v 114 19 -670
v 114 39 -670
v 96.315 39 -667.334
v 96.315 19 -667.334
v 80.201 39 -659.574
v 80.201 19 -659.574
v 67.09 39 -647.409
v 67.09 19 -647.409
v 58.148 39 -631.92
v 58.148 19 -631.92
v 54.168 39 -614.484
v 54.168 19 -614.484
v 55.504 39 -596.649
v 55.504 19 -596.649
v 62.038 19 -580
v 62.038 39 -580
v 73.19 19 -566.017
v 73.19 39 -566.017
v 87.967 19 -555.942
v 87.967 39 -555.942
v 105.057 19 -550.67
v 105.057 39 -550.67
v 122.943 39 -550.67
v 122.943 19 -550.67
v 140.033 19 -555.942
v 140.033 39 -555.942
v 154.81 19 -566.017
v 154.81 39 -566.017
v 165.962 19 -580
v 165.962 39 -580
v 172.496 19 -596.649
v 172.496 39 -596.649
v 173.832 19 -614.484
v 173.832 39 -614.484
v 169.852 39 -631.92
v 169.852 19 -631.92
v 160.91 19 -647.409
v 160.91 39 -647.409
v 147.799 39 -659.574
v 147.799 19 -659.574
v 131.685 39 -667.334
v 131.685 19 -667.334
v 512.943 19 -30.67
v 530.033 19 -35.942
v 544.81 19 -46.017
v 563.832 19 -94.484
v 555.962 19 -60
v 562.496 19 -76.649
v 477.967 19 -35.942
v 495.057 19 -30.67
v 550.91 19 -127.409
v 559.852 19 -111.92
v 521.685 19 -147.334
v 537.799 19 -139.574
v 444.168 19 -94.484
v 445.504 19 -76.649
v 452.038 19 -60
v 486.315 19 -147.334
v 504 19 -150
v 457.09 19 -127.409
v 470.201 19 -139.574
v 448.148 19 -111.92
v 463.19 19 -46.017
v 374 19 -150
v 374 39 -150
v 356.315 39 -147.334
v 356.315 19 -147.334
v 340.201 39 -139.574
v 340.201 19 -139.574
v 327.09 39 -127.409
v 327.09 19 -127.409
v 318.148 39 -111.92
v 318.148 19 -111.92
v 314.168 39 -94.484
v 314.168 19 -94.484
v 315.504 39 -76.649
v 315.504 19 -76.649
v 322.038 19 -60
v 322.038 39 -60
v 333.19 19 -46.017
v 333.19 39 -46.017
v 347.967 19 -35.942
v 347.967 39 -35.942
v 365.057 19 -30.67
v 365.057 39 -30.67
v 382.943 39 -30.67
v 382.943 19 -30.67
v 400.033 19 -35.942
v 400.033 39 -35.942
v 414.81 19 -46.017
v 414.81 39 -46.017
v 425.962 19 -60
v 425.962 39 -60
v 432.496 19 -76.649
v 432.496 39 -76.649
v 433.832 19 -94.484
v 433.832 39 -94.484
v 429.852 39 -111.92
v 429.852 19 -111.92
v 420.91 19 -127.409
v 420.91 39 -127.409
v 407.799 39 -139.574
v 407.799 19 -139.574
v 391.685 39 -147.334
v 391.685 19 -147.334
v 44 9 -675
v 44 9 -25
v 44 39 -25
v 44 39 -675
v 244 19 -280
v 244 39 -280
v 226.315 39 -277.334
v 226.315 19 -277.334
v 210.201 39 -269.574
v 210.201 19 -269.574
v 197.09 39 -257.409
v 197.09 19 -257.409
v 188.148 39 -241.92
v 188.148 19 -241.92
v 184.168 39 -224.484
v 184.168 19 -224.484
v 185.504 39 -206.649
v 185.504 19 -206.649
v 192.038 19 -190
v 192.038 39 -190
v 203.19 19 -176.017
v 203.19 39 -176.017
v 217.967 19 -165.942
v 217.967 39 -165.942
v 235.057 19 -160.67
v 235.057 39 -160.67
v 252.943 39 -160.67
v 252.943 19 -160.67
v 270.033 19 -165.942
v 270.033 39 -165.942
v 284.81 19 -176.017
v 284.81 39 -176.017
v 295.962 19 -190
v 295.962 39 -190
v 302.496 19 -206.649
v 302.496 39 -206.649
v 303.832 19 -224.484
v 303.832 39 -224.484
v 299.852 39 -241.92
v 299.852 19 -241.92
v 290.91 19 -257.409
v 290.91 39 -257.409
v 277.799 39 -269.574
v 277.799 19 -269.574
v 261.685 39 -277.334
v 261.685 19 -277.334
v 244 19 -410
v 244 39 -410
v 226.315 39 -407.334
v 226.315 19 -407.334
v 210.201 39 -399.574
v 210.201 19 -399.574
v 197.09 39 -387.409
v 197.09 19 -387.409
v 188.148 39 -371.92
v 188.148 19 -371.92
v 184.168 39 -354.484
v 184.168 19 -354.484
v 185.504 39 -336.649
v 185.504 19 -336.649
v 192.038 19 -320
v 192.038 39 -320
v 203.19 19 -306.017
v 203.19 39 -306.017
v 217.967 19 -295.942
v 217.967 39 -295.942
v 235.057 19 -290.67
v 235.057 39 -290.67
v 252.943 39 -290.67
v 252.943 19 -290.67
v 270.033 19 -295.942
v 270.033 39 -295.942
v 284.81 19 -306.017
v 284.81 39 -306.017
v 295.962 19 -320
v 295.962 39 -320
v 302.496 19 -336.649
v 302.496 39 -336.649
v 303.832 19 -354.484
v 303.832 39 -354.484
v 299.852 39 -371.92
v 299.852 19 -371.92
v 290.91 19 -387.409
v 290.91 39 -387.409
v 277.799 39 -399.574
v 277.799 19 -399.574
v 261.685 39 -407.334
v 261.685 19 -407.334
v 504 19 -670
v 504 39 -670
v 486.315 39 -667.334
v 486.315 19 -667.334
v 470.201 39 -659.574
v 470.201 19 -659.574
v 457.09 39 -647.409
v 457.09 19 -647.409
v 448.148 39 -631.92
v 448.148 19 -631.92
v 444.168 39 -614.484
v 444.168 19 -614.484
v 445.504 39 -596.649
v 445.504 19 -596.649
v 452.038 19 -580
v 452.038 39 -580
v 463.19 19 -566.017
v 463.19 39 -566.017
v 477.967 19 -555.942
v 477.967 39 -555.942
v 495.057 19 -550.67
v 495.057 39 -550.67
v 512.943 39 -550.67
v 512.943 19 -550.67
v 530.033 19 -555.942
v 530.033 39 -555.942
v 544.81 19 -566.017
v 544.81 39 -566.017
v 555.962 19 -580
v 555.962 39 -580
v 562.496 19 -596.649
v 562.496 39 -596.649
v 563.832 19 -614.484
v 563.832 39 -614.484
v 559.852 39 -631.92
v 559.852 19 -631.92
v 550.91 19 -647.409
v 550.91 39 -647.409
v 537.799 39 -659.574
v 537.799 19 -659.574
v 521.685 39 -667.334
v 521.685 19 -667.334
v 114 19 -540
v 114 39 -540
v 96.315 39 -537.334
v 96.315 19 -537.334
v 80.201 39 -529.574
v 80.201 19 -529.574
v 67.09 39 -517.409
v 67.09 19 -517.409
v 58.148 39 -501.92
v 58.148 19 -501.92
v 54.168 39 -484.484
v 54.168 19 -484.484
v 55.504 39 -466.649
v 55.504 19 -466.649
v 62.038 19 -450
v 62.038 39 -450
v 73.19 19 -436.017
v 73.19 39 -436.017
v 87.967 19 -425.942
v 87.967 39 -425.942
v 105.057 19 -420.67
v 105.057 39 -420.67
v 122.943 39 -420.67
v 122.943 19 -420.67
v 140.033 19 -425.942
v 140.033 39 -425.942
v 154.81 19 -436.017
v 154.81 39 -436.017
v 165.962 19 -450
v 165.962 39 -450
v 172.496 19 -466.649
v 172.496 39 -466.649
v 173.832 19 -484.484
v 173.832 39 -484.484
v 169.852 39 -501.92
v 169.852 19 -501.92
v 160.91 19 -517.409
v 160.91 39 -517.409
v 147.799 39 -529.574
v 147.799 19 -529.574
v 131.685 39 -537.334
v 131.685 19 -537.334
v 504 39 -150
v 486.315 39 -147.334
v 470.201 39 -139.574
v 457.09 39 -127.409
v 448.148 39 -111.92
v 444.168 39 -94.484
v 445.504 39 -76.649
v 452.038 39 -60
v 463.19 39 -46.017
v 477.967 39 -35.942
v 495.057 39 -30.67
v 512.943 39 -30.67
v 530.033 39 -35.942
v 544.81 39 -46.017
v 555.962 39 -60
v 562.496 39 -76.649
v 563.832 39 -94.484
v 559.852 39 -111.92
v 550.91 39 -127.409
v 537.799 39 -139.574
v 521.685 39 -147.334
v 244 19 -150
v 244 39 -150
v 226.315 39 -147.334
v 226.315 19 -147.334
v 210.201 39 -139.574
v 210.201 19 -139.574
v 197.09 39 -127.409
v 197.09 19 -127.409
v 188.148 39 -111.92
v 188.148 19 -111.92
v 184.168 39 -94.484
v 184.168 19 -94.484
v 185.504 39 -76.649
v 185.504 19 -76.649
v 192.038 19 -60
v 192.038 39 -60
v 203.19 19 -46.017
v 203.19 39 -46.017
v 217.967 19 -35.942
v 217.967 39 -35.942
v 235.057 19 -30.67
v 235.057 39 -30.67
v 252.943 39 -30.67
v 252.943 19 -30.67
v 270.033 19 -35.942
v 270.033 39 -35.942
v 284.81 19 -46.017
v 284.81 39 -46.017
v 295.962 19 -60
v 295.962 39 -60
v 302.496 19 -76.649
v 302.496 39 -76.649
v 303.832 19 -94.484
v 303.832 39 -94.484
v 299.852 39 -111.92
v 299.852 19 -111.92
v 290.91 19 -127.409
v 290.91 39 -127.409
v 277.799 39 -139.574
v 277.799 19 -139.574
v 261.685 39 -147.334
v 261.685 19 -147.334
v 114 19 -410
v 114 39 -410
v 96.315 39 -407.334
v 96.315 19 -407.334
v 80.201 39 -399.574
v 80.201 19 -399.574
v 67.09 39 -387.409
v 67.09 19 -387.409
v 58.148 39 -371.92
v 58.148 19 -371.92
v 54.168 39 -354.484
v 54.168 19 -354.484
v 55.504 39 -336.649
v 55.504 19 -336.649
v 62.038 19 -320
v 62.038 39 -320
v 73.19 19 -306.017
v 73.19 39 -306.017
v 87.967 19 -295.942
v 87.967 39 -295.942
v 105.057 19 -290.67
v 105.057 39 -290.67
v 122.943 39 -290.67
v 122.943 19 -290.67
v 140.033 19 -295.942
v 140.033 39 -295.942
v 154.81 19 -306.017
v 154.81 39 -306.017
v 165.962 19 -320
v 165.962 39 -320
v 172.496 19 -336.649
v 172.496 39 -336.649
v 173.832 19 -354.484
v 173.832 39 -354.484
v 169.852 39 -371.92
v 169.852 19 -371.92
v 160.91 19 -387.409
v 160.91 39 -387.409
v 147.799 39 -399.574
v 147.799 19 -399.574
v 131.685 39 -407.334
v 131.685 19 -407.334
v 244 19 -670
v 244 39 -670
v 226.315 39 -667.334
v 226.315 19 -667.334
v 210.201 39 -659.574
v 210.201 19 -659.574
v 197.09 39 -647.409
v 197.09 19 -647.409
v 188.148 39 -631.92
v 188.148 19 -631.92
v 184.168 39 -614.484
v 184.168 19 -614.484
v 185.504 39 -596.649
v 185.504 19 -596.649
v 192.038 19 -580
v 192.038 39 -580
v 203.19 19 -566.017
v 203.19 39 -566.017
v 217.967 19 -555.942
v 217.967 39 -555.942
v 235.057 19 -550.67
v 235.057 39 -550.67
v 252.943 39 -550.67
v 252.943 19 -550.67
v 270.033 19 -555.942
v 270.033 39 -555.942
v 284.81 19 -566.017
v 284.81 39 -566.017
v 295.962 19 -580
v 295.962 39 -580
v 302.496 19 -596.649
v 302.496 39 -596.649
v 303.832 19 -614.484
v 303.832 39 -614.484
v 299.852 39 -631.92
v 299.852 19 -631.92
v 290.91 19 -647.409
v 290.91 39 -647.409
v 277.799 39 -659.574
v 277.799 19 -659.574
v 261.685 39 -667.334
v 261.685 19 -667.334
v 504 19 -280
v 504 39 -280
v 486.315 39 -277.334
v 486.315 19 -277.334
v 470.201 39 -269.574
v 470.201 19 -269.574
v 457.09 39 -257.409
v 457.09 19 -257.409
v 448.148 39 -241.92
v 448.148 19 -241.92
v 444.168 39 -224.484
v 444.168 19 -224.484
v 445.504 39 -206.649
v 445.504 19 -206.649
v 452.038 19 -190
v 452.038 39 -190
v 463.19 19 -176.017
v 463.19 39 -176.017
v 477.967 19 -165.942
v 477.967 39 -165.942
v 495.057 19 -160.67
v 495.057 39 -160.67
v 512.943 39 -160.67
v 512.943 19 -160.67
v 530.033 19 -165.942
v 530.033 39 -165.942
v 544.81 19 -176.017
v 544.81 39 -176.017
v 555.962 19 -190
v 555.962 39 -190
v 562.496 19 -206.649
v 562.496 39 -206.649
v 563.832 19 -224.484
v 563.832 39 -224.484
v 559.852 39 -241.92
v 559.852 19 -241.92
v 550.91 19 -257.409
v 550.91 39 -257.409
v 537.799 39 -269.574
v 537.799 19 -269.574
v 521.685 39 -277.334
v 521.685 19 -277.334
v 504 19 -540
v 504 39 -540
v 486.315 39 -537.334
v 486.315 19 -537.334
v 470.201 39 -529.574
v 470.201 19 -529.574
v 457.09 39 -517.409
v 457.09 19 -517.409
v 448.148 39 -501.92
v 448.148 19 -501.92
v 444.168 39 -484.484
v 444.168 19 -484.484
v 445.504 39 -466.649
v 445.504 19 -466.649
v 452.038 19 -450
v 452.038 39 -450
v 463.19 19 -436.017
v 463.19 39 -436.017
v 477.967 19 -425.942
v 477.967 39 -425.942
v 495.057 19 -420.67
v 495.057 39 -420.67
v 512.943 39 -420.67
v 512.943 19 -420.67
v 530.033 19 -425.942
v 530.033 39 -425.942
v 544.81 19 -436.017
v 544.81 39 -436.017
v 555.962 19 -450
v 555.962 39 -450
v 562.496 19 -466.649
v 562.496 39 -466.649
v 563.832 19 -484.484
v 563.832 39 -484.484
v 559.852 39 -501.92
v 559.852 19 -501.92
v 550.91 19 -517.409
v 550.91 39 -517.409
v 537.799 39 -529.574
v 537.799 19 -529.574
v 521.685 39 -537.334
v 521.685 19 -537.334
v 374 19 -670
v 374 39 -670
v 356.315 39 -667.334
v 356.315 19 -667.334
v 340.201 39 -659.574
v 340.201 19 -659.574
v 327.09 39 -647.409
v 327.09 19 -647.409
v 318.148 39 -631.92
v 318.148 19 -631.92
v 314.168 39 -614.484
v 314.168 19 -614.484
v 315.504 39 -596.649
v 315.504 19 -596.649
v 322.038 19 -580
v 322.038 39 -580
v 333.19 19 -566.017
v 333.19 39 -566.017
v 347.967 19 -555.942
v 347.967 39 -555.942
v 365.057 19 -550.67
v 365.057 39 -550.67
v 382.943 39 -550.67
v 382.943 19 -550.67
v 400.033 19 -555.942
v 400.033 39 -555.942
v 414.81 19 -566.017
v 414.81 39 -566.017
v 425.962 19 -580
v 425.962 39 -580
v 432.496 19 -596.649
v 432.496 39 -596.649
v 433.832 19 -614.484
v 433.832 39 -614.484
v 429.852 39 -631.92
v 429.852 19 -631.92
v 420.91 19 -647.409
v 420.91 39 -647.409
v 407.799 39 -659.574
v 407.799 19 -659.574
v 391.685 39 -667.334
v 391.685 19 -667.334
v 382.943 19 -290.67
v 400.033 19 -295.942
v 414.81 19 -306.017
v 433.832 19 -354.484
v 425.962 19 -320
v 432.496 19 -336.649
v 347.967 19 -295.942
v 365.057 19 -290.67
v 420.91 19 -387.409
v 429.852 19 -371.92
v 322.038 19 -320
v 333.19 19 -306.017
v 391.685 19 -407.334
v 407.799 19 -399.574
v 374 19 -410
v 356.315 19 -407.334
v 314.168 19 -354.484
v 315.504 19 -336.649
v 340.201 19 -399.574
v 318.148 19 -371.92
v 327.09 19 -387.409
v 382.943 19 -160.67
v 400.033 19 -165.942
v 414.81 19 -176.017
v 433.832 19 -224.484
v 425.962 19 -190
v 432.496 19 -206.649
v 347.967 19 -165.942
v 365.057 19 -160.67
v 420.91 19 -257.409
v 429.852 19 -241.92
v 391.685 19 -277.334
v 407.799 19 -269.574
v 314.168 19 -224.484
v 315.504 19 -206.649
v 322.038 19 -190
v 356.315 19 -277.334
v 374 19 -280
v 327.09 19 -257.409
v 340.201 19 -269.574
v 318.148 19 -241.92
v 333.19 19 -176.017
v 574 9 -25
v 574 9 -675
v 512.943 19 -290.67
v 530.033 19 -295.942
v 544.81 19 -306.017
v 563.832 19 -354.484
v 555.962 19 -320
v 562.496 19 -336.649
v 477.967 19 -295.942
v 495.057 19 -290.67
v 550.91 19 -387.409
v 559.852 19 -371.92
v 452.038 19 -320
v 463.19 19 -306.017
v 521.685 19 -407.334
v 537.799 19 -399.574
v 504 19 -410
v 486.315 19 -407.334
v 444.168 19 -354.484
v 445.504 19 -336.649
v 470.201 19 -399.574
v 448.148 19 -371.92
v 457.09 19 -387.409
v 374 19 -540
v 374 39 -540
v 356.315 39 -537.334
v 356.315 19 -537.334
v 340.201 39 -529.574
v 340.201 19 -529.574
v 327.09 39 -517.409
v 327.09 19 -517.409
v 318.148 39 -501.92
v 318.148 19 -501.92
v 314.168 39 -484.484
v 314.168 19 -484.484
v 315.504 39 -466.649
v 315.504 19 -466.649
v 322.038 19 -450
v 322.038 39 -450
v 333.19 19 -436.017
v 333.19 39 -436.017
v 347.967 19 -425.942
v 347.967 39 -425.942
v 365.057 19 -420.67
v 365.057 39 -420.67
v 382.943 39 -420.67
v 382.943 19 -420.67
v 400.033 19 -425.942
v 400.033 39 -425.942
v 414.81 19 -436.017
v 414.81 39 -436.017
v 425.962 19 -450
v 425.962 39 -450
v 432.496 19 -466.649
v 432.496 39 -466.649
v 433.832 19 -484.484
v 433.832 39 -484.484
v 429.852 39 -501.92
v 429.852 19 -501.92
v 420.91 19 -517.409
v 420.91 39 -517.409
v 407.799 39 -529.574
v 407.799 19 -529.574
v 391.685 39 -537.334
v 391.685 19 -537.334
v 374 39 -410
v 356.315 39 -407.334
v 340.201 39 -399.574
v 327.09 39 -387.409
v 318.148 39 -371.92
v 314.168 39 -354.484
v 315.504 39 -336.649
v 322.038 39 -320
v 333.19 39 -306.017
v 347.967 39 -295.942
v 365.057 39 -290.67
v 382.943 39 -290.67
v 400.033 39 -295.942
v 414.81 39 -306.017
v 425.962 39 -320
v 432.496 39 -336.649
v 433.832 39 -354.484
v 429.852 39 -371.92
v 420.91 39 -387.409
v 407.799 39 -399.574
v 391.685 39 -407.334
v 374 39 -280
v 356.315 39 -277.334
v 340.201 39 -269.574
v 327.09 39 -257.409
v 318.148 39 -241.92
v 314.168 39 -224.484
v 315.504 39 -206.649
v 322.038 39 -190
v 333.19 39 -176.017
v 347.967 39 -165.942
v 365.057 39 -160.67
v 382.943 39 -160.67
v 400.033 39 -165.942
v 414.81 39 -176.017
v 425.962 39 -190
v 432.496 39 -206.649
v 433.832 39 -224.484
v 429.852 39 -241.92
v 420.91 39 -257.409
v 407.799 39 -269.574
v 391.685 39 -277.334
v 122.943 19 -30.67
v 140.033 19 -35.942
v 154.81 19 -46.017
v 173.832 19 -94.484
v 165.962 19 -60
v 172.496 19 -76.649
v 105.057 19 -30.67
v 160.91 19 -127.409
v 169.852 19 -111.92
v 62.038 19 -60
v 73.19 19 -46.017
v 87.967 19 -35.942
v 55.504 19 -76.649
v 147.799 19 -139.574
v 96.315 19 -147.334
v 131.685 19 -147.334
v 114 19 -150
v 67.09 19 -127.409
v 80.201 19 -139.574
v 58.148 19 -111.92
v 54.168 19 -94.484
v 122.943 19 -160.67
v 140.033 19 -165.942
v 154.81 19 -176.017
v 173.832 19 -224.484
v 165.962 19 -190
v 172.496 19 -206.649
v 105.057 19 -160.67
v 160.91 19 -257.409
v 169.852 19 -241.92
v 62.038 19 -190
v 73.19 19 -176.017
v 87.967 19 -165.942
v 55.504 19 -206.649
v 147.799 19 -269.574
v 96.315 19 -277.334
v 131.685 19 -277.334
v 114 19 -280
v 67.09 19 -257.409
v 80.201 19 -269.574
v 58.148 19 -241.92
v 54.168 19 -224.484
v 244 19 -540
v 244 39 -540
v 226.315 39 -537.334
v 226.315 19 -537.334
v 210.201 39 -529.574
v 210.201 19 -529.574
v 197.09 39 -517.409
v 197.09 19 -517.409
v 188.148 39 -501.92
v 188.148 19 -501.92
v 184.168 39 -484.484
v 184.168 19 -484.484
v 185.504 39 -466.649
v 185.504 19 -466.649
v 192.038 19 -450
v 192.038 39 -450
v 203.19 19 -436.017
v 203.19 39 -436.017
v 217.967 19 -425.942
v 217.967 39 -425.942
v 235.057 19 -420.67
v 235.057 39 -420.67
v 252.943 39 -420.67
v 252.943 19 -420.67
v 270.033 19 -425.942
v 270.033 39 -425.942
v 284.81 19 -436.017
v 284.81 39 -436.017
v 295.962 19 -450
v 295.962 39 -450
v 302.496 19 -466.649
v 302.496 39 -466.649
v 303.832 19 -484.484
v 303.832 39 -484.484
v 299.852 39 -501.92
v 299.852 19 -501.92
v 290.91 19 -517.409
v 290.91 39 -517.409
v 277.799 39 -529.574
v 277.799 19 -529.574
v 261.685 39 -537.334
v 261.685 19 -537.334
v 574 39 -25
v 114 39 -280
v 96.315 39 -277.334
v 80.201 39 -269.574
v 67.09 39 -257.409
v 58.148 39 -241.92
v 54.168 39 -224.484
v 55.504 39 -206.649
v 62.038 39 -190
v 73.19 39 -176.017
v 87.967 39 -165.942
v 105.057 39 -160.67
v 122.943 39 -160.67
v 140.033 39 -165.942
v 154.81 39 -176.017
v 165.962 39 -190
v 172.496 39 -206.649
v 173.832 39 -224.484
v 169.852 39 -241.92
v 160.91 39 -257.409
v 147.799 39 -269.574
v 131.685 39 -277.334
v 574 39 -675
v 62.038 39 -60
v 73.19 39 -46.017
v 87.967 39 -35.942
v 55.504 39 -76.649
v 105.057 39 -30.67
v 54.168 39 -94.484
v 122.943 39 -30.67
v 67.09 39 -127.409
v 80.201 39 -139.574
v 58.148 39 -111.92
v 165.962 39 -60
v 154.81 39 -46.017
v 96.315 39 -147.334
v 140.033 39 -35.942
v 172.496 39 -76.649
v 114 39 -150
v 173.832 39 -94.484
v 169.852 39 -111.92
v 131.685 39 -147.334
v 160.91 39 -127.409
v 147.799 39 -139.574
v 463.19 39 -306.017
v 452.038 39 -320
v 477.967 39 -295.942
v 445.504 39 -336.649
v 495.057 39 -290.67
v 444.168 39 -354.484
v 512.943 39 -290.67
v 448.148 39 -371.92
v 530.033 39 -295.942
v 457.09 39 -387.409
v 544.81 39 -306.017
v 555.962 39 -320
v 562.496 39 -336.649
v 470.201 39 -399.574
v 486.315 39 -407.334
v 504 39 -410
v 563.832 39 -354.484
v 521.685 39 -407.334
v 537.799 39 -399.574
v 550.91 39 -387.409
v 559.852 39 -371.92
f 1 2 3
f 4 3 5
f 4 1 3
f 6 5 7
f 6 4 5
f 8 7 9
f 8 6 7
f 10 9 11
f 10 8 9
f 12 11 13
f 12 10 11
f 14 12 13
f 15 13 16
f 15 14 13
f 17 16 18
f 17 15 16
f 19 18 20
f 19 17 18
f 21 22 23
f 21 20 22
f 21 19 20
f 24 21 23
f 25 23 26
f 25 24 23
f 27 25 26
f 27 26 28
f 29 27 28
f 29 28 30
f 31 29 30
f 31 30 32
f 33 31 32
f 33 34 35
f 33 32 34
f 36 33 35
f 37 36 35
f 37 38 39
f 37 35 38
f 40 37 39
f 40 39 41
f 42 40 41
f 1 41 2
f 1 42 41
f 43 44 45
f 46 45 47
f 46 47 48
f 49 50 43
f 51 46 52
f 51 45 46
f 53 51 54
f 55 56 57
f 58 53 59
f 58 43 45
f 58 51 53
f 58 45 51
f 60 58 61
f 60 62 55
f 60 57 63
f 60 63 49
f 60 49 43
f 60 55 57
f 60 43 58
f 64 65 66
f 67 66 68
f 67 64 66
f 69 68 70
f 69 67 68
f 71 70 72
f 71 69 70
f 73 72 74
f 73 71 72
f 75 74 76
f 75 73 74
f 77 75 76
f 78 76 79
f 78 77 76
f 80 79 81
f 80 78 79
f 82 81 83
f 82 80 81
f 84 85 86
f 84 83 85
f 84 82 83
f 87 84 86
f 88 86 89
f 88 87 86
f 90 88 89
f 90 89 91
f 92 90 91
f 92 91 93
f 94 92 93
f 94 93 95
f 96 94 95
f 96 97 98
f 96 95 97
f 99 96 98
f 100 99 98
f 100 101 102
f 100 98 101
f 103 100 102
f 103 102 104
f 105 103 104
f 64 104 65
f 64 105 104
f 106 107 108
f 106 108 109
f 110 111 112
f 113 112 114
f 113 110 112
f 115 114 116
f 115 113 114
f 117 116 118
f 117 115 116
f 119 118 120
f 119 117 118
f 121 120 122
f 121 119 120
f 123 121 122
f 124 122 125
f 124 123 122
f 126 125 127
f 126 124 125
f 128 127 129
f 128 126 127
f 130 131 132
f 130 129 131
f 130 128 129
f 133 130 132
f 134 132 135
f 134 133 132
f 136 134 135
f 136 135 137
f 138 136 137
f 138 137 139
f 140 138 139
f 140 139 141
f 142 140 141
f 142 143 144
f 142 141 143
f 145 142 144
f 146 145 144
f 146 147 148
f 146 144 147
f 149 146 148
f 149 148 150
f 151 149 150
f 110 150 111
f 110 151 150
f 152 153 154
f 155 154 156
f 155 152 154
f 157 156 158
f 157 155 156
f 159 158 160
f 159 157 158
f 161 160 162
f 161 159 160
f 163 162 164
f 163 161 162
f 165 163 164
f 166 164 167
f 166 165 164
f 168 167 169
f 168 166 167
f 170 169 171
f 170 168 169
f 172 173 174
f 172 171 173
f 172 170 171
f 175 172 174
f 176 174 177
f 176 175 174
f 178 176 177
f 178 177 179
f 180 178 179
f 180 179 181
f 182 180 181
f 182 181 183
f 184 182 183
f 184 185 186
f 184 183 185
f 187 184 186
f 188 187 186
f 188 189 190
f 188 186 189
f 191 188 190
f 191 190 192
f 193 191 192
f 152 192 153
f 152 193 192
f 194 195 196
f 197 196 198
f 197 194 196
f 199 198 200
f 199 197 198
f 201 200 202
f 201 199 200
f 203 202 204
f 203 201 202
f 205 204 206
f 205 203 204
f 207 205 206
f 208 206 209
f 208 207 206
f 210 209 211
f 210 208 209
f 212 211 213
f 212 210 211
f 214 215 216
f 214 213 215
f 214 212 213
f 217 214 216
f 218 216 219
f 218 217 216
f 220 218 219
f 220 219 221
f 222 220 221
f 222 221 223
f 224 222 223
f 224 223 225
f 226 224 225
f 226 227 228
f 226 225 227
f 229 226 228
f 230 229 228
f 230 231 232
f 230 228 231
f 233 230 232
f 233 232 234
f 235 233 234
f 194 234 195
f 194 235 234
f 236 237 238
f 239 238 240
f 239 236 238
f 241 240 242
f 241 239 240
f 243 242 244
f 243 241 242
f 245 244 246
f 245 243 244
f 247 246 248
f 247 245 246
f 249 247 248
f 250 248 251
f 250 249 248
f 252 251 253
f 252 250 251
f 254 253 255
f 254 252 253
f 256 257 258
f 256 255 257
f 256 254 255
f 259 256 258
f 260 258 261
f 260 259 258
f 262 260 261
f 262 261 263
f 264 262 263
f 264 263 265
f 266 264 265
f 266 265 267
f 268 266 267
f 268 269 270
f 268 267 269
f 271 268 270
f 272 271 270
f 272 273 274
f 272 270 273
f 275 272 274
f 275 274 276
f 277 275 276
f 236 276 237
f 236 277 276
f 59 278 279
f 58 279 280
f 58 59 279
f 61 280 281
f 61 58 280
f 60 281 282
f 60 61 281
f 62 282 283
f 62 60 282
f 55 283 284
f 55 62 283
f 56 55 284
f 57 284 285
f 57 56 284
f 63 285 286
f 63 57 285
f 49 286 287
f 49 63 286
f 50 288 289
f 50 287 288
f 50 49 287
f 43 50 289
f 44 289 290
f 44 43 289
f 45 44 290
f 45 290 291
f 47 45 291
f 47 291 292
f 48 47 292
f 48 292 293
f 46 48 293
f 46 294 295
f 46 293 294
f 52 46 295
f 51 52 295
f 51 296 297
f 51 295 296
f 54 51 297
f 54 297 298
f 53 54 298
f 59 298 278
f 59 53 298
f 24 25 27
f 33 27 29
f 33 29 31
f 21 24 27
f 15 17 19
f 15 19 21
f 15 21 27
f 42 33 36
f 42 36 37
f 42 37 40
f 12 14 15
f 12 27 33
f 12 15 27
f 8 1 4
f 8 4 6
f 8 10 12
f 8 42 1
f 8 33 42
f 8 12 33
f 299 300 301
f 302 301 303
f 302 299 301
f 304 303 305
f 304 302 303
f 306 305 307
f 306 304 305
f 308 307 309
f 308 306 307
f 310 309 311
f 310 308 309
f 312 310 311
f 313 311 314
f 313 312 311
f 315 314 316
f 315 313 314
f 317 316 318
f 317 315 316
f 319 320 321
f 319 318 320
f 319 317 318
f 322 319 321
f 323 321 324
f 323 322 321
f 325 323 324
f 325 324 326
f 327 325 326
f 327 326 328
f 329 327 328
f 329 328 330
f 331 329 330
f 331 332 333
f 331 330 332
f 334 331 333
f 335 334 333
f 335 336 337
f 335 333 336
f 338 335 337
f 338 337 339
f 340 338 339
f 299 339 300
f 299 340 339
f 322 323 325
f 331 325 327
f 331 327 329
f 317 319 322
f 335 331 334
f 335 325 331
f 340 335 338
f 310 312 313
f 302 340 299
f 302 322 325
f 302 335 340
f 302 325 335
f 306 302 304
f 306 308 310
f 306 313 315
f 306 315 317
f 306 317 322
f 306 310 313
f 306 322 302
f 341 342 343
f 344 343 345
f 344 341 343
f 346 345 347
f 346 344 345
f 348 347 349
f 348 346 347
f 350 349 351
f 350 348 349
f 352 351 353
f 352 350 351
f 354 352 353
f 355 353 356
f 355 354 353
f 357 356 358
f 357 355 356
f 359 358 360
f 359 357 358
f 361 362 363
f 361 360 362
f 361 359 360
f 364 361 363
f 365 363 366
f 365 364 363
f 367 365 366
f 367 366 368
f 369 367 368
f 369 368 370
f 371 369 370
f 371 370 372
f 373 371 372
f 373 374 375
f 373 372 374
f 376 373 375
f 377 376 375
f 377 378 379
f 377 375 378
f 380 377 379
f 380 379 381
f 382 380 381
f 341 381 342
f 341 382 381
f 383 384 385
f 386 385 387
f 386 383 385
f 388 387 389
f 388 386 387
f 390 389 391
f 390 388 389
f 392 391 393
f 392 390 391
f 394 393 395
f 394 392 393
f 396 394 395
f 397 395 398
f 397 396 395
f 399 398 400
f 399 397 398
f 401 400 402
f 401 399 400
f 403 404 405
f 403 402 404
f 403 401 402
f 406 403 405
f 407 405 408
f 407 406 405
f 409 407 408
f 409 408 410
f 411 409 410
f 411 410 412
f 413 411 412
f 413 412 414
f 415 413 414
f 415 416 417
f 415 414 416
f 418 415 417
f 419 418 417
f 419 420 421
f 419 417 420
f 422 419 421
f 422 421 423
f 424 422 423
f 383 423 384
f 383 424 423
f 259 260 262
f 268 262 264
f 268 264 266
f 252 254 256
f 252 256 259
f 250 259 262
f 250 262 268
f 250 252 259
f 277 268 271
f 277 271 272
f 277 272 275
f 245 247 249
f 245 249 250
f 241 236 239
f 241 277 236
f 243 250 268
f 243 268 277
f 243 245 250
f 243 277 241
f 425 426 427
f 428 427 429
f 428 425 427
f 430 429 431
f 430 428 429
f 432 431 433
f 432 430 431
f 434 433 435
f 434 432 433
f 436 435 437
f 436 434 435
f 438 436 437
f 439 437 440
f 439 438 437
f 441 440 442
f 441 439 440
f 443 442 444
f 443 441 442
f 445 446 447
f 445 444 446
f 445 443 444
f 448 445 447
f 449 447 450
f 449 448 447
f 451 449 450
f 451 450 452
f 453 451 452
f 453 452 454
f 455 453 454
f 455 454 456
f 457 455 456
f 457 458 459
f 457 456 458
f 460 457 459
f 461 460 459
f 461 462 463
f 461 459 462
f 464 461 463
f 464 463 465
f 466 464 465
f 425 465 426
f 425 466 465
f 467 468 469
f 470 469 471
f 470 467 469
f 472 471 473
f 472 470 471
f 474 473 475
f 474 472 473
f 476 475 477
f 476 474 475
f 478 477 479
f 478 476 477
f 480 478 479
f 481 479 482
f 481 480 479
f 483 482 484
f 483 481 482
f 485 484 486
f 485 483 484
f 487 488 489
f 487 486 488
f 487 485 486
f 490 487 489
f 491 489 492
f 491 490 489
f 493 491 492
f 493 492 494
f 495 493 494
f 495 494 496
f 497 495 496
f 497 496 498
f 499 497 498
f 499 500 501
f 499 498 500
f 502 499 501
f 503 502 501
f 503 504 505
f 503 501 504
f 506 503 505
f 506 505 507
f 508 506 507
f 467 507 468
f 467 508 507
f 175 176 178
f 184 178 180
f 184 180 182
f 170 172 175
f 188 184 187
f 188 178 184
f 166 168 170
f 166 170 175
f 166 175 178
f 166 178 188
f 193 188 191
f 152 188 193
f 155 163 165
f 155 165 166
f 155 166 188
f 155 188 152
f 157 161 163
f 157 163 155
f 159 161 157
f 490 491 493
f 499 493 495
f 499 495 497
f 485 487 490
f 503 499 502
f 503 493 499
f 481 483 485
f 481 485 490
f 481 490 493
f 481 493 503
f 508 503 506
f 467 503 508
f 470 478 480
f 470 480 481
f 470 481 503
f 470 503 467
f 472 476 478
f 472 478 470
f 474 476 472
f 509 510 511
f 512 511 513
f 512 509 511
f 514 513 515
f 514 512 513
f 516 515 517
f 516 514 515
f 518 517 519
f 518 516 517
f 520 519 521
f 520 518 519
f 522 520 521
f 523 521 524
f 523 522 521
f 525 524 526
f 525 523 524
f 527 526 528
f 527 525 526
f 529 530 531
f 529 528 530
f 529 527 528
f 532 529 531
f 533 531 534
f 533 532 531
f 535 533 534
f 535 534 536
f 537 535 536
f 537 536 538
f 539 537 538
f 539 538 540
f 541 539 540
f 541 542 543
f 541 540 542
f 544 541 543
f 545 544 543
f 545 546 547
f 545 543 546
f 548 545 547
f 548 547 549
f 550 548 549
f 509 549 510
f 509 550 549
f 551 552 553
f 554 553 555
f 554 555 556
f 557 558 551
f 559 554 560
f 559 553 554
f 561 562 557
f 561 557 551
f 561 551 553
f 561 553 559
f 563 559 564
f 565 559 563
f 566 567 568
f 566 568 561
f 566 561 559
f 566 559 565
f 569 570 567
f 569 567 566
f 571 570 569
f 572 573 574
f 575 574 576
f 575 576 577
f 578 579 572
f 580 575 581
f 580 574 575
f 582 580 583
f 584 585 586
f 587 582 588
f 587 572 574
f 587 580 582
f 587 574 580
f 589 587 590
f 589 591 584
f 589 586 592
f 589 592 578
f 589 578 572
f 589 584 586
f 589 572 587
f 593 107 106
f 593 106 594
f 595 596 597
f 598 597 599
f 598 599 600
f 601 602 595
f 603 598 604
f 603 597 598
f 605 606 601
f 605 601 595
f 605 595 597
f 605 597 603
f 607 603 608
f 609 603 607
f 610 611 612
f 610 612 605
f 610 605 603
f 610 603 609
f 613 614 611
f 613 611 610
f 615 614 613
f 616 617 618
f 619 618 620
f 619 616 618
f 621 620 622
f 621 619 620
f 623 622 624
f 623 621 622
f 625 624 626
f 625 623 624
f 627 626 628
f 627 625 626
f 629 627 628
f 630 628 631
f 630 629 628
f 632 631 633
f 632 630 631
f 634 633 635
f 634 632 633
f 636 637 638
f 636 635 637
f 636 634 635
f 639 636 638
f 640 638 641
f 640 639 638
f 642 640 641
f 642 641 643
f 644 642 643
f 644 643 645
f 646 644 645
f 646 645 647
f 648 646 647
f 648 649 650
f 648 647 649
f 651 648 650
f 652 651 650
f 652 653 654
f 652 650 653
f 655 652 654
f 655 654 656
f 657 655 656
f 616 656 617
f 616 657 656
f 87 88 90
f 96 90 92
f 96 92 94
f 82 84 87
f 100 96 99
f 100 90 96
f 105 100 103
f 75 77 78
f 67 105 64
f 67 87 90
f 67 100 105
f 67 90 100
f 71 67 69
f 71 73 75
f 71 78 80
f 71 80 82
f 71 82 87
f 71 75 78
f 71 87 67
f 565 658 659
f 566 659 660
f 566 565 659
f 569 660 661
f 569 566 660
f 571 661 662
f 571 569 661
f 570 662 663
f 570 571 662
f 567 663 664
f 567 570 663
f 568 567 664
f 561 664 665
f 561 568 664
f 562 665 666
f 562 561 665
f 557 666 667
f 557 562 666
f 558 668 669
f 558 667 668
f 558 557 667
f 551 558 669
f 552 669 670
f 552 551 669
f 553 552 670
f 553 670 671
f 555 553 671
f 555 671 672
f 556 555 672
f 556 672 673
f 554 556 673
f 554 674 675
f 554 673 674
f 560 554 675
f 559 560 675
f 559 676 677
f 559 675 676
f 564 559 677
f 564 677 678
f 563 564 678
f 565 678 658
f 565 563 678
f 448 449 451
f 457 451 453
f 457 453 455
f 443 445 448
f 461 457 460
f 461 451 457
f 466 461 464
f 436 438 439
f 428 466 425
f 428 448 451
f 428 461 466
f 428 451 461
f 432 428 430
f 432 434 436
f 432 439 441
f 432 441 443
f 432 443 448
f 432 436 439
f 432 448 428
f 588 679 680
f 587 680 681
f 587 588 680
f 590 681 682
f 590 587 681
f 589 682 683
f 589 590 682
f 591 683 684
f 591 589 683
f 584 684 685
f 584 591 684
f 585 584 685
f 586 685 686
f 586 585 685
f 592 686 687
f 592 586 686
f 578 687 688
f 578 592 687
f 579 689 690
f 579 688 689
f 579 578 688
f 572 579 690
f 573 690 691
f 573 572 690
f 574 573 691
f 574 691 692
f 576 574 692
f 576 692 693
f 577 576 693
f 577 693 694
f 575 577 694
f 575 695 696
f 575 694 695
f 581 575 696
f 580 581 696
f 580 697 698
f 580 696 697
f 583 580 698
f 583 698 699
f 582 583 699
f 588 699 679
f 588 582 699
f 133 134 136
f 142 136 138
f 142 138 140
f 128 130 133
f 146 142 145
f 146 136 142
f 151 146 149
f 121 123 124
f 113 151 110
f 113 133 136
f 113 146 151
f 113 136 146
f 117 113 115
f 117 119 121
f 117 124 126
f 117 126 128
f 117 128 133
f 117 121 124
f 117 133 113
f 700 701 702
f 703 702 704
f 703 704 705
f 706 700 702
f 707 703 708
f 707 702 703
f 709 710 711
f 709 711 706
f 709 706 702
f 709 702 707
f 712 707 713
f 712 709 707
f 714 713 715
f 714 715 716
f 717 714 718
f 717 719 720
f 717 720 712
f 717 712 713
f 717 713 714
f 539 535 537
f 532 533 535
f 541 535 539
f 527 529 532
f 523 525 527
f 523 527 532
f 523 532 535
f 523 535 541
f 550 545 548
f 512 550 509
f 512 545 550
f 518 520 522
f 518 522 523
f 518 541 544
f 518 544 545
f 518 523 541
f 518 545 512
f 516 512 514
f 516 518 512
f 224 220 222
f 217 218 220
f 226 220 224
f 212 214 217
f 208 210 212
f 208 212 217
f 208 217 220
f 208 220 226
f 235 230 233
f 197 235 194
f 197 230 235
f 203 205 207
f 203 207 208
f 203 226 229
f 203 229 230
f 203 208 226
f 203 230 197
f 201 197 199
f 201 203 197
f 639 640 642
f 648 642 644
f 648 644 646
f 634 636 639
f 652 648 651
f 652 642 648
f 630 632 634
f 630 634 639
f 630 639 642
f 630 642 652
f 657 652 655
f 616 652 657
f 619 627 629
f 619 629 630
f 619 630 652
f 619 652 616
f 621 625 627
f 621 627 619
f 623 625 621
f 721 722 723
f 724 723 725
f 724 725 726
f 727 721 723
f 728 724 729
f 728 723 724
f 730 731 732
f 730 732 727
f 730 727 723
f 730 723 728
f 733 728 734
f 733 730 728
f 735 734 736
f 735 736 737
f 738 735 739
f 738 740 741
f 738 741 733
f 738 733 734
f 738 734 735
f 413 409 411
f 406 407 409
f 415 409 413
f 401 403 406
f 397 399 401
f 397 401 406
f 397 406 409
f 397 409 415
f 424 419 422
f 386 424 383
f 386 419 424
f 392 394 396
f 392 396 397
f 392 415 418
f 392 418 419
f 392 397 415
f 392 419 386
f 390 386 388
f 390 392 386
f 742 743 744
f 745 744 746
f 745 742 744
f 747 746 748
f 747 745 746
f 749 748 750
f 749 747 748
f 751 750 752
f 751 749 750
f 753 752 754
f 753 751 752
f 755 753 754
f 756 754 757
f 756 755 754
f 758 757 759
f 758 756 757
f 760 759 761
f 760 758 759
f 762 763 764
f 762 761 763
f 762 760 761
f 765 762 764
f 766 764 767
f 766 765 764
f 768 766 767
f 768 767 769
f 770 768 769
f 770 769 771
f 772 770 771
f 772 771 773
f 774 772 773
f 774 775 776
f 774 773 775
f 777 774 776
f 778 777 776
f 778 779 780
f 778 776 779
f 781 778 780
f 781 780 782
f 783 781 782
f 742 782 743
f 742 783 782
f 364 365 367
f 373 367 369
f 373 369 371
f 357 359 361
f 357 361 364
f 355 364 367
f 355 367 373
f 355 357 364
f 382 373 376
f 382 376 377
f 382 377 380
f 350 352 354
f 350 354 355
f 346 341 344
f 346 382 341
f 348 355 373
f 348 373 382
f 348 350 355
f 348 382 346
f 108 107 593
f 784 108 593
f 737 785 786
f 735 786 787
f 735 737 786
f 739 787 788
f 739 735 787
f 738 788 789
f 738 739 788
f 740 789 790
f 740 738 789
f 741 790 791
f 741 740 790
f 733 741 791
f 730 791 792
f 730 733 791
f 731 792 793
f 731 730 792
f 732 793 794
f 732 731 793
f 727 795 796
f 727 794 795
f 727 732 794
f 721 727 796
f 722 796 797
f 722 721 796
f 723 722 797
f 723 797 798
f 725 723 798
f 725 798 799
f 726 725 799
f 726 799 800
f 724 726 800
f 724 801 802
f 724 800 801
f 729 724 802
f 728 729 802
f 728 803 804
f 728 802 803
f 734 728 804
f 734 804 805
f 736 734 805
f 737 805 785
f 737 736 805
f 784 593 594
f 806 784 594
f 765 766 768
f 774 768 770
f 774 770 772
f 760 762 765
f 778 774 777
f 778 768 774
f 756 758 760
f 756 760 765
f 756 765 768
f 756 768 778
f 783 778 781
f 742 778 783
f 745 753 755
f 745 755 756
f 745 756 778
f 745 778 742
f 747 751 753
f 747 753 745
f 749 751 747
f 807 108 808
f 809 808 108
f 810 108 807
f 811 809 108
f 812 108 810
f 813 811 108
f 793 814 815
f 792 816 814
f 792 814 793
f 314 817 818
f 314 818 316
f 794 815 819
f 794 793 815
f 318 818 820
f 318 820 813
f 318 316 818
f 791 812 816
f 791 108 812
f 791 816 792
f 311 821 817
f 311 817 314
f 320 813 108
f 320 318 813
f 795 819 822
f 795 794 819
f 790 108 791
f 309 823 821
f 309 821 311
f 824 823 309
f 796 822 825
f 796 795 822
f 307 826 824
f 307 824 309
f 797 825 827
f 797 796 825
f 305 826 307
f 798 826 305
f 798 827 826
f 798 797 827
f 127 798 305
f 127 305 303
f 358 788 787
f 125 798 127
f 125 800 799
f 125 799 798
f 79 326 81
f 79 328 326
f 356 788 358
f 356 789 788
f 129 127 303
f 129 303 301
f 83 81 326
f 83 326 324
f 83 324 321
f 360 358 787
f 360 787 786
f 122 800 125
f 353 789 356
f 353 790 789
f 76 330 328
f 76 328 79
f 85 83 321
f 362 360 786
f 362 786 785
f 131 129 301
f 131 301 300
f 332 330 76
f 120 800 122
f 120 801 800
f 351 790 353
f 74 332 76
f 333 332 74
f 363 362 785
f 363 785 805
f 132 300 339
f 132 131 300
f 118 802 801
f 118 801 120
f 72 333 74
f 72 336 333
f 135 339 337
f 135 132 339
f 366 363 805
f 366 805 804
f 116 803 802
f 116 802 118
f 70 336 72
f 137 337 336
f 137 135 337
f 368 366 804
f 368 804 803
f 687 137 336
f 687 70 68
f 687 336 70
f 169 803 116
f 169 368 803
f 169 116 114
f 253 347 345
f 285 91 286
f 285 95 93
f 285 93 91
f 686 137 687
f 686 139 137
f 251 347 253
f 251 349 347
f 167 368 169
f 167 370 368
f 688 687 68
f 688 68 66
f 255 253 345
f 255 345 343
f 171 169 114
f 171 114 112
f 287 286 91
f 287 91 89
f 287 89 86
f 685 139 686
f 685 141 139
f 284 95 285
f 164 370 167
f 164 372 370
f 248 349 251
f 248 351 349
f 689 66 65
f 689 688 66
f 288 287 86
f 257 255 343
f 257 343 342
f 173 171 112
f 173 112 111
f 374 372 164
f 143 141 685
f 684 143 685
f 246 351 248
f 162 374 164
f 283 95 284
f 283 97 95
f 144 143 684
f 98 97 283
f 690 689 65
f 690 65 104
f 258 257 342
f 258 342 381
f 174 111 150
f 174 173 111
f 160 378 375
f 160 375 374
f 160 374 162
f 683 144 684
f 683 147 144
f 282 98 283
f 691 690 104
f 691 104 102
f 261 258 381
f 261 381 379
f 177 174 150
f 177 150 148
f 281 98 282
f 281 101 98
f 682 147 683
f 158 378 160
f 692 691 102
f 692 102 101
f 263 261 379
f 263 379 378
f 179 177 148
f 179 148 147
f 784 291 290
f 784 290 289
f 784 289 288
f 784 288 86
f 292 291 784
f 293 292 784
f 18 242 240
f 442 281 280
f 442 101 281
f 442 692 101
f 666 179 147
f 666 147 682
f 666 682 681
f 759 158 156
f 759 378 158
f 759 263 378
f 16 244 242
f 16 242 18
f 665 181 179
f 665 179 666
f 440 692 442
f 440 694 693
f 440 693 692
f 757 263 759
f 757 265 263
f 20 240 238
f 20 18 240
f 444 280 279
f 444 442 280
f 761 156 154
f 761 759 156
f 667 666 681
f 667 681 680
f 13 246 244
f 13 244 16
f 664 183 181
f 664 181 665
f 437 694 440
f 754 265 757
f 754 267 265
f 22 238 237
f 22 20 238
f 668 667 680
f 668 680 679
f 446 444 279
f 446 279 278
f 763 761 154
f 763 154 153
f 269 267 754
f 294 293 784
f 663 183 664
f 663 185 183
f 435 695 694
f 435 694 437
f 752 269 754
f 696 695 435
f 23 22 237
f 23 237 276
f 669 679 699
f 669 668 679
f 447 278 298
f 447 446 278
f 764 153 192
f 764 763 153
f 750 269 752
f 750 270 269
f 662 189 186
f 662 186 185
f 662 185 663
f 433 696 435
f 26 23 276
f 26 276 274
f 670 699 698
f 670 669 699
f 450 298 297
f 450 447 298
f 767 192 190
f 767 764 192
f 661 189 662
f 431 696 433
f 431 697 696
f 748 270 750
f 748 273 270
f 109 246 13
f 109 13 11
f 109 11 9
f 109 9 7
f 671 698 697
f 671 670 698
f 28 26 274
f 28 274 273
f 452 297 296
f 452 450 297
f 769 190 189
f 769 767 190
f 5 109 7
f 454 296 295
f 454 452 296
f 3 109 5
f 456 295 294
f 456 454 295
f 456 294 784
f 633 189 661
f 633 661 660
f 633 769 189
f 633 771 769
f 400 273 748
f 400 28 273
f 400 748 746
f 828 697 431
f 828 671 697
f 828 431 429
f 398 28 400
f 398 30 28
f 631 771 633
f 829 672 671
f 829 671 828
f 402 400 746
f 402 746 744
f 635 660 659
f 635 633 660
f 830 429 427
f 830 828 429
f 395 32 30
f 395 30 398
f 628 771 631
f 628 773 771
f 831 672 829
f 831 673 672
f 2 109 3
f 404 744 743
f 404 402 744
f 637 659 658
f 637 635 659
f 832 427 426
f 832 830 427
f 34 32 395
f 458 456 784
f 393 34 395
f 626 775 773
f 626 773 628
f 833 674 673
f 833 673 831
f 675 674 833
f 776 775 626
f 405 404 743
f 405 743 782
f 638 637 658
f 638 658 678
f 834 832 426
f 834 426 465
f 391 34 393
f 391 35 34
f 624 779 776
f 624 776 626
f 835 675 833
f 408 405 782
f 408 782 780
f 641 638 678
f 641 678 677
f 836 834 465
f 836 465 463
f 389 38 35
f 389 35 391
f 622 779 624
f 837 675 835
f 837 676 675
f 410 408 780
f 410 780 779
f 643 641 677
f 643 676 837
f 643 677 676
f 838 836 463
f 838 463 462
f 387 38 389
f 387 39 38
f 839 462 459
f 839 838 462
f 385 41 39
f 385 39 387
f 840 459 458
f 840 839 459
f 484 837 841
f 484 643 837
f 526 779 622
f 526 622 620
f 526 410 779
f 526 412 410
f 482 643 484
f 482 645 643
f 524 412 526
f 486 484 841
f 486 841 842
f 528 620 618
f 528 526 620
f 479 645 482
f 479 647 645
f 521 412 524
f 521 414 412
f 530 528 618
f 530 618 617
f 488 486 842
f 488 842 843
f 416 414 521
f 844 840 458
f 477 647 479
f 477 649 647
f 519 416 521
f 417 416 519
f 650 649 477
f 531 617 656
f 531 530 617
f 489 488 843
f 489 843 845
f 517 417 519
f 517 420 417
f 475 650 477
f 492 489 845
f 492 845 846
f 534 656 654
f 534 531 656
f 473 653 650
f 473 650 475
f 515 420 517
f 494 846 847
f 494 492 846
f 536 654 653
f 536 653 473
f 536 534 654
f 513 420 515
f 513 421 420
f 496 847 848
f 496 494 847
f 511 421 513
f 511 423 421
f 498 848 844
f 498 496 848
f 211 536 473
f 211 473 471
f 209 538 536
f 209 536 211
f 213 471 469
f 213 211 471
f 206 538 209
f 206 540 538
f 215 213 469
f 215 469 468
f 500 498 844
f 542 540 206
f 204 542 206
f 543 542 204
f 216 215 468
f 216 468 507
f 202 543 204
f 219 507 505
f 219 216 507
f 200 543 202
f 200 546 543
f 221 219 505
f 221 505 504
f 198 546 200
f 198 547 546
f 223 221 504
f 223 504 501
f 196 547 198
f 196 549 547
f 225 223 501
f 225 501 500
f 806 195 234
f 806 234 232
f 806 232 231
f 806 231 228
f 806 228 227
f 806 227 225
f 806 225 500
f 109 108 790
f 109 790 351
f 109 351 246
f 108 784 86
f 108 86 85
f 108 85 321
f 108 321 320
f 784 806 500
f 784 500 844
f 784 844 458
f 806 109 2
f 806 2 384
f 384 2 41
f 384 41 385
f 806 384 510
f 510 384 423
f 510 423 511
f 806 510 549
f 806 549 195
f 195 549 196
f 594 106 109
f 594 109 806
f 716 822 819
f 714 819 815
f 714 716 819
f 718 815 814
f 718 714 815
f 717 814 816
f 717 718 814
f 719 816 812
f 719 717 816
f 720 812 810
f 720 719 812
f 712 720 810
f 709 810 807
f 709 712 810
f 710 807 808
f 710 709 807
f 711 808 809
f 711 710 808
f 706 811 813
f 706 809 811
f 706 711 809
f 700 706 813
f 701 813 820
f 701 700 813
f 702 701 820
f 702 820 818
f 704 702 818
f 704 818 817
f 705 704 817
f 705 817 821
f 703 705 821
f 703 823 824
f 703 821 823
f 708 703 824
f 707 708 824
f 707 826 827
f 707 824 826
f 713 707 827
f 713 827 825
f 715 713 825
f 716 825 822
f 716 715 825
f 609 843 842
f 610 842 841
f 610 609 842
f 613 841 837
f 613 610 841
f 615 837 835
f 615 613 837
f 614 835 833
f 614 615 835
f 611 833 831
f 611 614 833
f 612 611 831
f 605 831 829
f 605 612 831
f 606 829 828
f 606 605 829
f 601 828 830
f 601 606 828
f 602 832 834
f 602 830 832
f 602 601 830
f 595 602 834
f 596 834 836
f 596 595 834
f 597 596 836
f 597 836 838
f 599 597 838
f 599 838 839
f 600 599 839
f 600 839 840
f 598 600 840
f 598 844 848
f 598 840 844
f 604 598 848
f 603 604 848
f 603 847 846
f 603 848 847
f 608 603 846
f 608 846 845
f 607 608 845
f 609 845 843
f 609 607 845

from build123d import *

# Parameters (mm, degrees)
TPS_SILIKON_GN21_20_CUKUR_1_START  = 9
SKETCH1_W                          = 530
SKETCH1_H                          = 650
TPS_SILIKON_GN21_20_CUKUR_1_DEPTH  = 30
TPS_SILIKON_GN21_20_CUKUR_2_START  = 19
SKETCH2_R                          = 60
TPS_SILIKON_GN21_20_CUKUR_2_DEPTH  = 21
TPS_SILIKON_GN21_20_CUKUR_3_START  = 19
SKETCH3_R                          = 60
TPS_SILIKON_GN21_20_CUKUR_3_DEPTH  = 21
TPS_SILIKON_GN21_20_CUKUR_4_START  = 19
SKETCH4_R                          = 60
TPS_SILIKON_GN21_20_CUKUR_4_DEPTH  = 21
TPS_SILIKON_GN21_20_CUKUR_5_START  = 19
SKETCH5_R                          = 60
TPS_SILIKON_GN21_20_CUKUR_5_DEPTH  = 21
TPS_SILIKON_GN21_20_CUKUR_6_START  = 19
SKETCH6_R                          = 60
TPS_SILIKON_GN21_20_CUKUR_6_DEPTH  = 21
TPS_SILIKON_GN21_20_CUKUR_7_START  = 19
SKETCH7_R                          = 60
TPS_SILIKON_GN21_20_CUKUR_7_DEPTH  = 21
TPS_SILIKON_GN21_20_CUKUR_8_START  = 19
SKETCH8_R                          = 60
TPS_SILIKON_GN21_20_CUKUR_8_DEPTH  = 21
TPS_SILIKON_GN21_20_CUKUR_9_START  = 19
SKETCH9_R                          = 60
TPS_SILIKON_GN21_20_CUKUR_9_DEPTH  = 21
TPS_SILIKON_GN21_20_CUKUR_10_START = 19
SKETCH10_R                         = 60
TPS_SILIKON_GN21_20_CUKUR_10_DEPTH = 21
TPS_SILIKON_GN21_20_CUKUR_11_START = 19
SKETCH11_R                         = 60
TPS_SILIKON_GN21_20_CUKUR_11_DEPTH = 21
TPS_SILIKON_GN21_20_CUKUR_12_START = 19
SKETCH12_R                         = 60
TPS_SILIKON_GN21_20_CUKUR_12_DEPTH = 21
TPS_SILIKON_GN21_20_CUKUR_13_START = 19
SKETCH13_R                         = 60
TPS_SILIKON_GN21_20_CUKUR_13_DEPTH = 21
TPS_SILIKON_GN21_20_CUKUR_14_START = 19
SKETCH14_R                         = 60
TPS_SILIKON_GN21_20_CUKUR_14_DEPTH = 21
TPS_SILIKON_GN21_20_CUKUR_15_START = 19
SKETCH15_R                         = 60
TPS_SILIKON_GN21_20_CUKUR_15_DEPTH = 21
TPS_SILIKON_GN21_20_CUKUR_16_START = 19
SKETCH16_R                         = 60
TPS_SILIKON_GN21_20_CUKUR_16_DEPTH = 21
TPS_SILIKON_GN21_20_CUKUR_17_START = 19
SKETCH17_R                         = 60
TPS_SILIKON_GN21_20_CUKUR_17_DEPTH = 21
TPS_SILIKON_GN21_20_CUKUR_18_START = 19
SKETCH18_R                         = 60
TPS_SILIKON_GN21_20_CUKUR_18_DEPTH = 21
TPS_SILIKON_GN21_20_CUKUR_19_START = 19
SKETCH19_R                         = 60
TPS_SILIKON_GN21_20_CUKUR_19_DEPTH = 21
TPS_SILIKON_GN21_20_CUKUR_20_START = 19
SKETCH20_R                         = 60
TPS_SILIKON_GN21_20_CUKUR_20_DEPTH = 21
TPS_SILIKON_GN21_20_CUKUR_21_START = 19
SKETCH21_R                         = 60
TPS_SILIKON_GN21_20_CUKUR_21_DEPTH = 21


with BuildPart() as part:
    # Sketch1 → TPS_silikon_GN21_20_cukur_1 (new body)
    with BuildSketch(Plane(origin=(0, 0, 0), x_dir=(1, 0, 0), z_dir=(0, 1, 0)).offset(TPS_SILIKON_GN21_20_CUKUR_1_START)):
        with Locations((309, 350)):
            Rectangle(SKETCH1_W, SKETCH1_H)
    extrude(amount=TPS_SILIKON_GN21_20_CUKUR_1_DEPTH)

    # Sketch2 → TPS_silikon_GN21_20_cukur_2 (cut)
    with BuildSketch(Plane(origin=(0, 0, 0), x_dir=(1, 0, 0), z_dir=(0, 1, 0)).offset(TPS_SILIKON_GN21_20_CUKUR_2_START)):
        with Locations(Location((114, 610, 0), (0, 0, 90))):
            Circle(SKETCH2_R)
    extrude(amount=TPS_SILIKON_GN21_20_CUKUR_2_DEPTH, mode=Mode.SUBTRACT)

    # Sketch3 → TPS_silikon_GN21_20_cukur_3 (cut)
    with BuildSketch(Plane(origin=(0, 0, 0), x_dir=(1, 0, 0), z_dir=(0, 1, 0)).offset(TPS_SILIKON_GN21_20_CUKUR_3_START)):
        with Locations(Location((114, 480, 0), (0, 0, 90))):
            Circle(SKETCH3_R)
    extrude(amount=TPS_SILIKON_GN21_20_CUKUR_3_DEPTH, mode=Mode.SUBTRACT)

    # Sketch4 → TPS_silikon_GN21_20_cukur_4 (cut)
    with BuildSketch(Plane(origin=(0, 0, 0), x_dir=(1, 0, 0), z_dir=(0, 1, 0)).offset(TPS_SILIKON_GN21_20_CUKUR_4_START)):
        with Locations(Location((114, 350, 0), (0, 0, 90))):
            Circle(SKETCH4_R)
    extrude(amount=TPS_SILIKON_GN21_20_CUKUR_4_DEPTH, mode=Mode.SUBTRACT)

    # Sketch5 → TPS_silikon_GN21_20_cukur_5 (cut)
    with BuildSketch(Plane(origin=(0, 0, 0), x_dir=(1, 0, 0), z_dir=(0, 1, 0)).offset(TPS_SILIKON_GN21_20_CUKUR_5_START)):
        with Locations(Location((114, 220, 0), (0, 0, 90))):
            Circle(SKETCH5_R)
    extrude(amount=TPS_SILIKON_GN21_20_CUKUR_5_DEPTH, mode=Mode.SUBTRACT)

    # Sketch6 → TPS_silikon_GN21_20_cukur_6 (cut)
    with BuildSketch(Plane(origin=(0, 0, 0), x_dir=(1, 0, 0), z_dir=(0, 1, 0)).offset(TPS_SILIKON_GN21_20_CUKUR_6_START)):
        with Locations(Location((114, 90, 0), (0, 0, 90))):
            Circle(SKETCH6_R)
    extrude(amount=TPS_SILIKON_GN21_20_CUKUR_6_DEPTH, mode=Mode.SUBTRACT)

    # Sketch7 → TPS_silikon_GN21_20_cukur_7 (cut)
    with BuildSketch(Plane(origin=(0, 0, 0), x_dir=(1, 0, 0), z_dir=(0, 1, 0)).offset(TPS_SILIKON_GN21_20_CUKUR_7_START)):
        with Locations(Location((244, 610, 0), (0, 0, 90))):
            Circle(SKETCH7_R)
    extrude(amount=TPS_SILIKON_GN21_20_CUKUR_7_DEPTH, mode=Mode.SUBTRACT)

    # Sketch8 → TPS_silikon_GN21_20_cukur_8 (cut)
    with BuildSketch(Plane(origin=(0, 0, 0), x_dir=(1, 0, 0), z_dir=(0, 1, 0)).offset(TPS_SILIKON_GN21_20_CUKUR_8_START)):
        with Locations(Location((244, 480, 0), (0, 0, 90))):
            Circle(SKETCH8_R)
    extrude(amount=TPS_SILIKON_GN21_20_CUKUR_8_DEPTH, mode=Mode.SUBTRACT)

    # Sketch9 → TPS_silikon_GN21_20_cukur_9 (cut)
    with BuildSketch(Plane(origin=(0, 0, 0), x_dir=(1, 0, 0), z_dir=(0, 1, 0)).offset(TPS_SILIKON_GN21_20_CUKUR_9_START)):
        with Locations(Location((244, 350, 0), (0, 0, 90))):
            Circle(SKETCH9_R)
    extrude(amount=TPS_SILIKON_GN21_20_CUKUR_9_DEPTH, mode=Mode.SUBTRACT)

    # Sketch10 → TPS_silikon_GN21_20_cukur_10 (cut)
    with BuildSketch(Plane(origin=(0, 0, 0), x_dir=(1, 0, 0), z_dir=(0, 1, 0)).offset(TPS_SILIKON_GN21_20_CUKUR_10_START)):
        with Locations(Location((244, 220, 0), (0, 0, 90))):
            Circle(SKETCH10_R)
    extrude(amount=TPS_SILIKON_GN21_20_CUKUR_10_DEPTH, mode=Mode.SUBTRACT)

    # Sketch11 → TPS_silikon_GN21_20_cukur_11 (cut)
    with BuildSketch(Plane(origin=(0, 0, 0), x_dir=(1, 0, 0), z_dir=(0, 1, 0)).offset(TPS_SILIKON_GN21_20_CUKUR_11_START)):
        with Locations(Location((244, 90, 0), (0, 0, 90))):
            Circle(SKETCH11_R)
    extrude(amount=TPS_SILIKON_GN21_20_CUKUR_11_DEPTH, mode=Mode.SUBTRACT)

    # Sketch12 → TPS_silikon_GN21_20_cukur_12 (cut)
    with BuildSketch(Plane(origin=(0, 0, 0), x_dir=(1, 0, 0), z_dir=(0, 1, 0)).offset(TPS_SILIKON_GN21_20_CUKUR_12_START)):
        with Locations(Location((374, 610, 0), (0, 0, 90))):
            Circle(SKETCH12_R)
    extrude(amount=TPS_SILIKON_GN21_20_CUKUR_12_DEPTH, mode=Mode.SUBTRACT)

    # Sketch13 → TPS_silikon_GN21_20_cukur_13 (cut)
    with BuildSketch(Plane(origin=(0, 0, 0), x_dir=(1, 0, 0), z_dir=(0, 1, 0)).offset(TPS_SILIKON_GN21_20_CUKUR_13_START)):
        with Locations(Location((374, 480, 0), (0, 0, 90))):
            Circle(SKETCH13_R)
    extrude(amount=TPS_SILIKON_GN21_20_CUKUR_13_DEPTH, mode=Mode.SUBTRACT)

    # Sketch14 → TPS_silikon_GN21_20_cukur_14 (cut)
    with BuildSketch(Plane(origin=(0, 0, 0), x_dir=(1, 0, 0), z_dir=(0, 1, 0)).offset(TPS_SILIKON_GN21_20_CUKUR_14_START)):
        with Locations(Location((374, 350, 0), (0, 0, 90))):
            Circle(SKETCH14_R)
    extrude(amount=TPS_SILIKON_GN21_20_CUKUR_14_DEPTH, mode=Mode.SUBTRACT)

    # Sketch15 → TPS_silikon_GN21_20_cukur_15 (cut)
    with BuildSketch(Plane(origin=(0, 0, 0), x_dir=(1, 0, 0), z_dir=(0, 1, 0)).offset(TPS_SILIKON_GN21_20_CUKUR_15_START)):
        with Locations(Location((374, 220, 0), (0, 0, 90))):
            Circle(SKETCH15_R)
    extrude(amount=TPS_SILIKON_GN21_20_CUKUR_15_DEPTH, mode=Mode.SUBTRACT)

    # Sketch16 → TPS_silikon_GN21_20_cukur_16 (cut)
    with BuildSketch(Plane(origin=(0, 0, 0), x_dir=(1, 0, 0), z_dir=(0, 1, 0)).offset(TPS_SILIKON_GN21_20_CUKUR_16_START)):
        with Locations(Location((374, 90, 0), (0, 0, 90))):
            Circle(SKETCH16_R)
    extrude(amount=TPS_SILIKON_GN21_20_CUKUR_16_DEPTH, mode=Mode.SUBTRACT)

    # Sketch17 → TPS_silikon_GN21_20_cukur_17 (cut)
    with BuildSketch(Plane(origin=(0, 0, 0), x_dir=(1, 0, 0), z_dir=(0, 1, 0)).offset(TPS_SILIKON_GN21_20_CUKUR_17_START)):
        with Locations(Location((504, 610, 0), (0, 0, 90))):
            Circle(SKETCH17_R)
    extrude(amount=TPS_SILIKON_GN21_20_CUKUR_17_DEPTH, mode=Mode.SUBTRACT)

    # Sketch18 → TPS_silikon_GN21_20_cukur_18 (cut)
    with BuildSketch(Plane(origin=(0, 0, 0), x_dir=(1, 0, 0), z_dir=(0, 1, 0)).offset(TPS_SILIKON_GN21_20_CUKUR_18_START)):
        with Locations(Location((504, 480, 0), (0, 0, 90))):
            Circle(SKETCH18_R)
    extrude(amount=TPS_SILIKON_GN21_20_CUKUR_18_DEPTH, mode=Mode.SUBTRACT)

    # Sketch19 → TPS_silikon_GN21_20_cukur_19 (cut)
    with BuildSketch(Plane(origin=(0, 0, 0), x_dir=(1, 0, 0), z_dir=(0, 1, 0)).offset(TPS_SILIKON_GN21_20_CUKUR_19_START)):
        with Locations(Location((504, 350, 0), (0, 0, 90))):
            Circle(SKETCH19_R)
    extrude(amount=TPS_SILIKON_GN21_20_CUKUR_19_DEPTH, mode=Mode.SUBTRACT)

    # Sketch20 → TPS_silikon_GN21_20_cukur_20 (cut)
    with BuildSketch(Plane(origin=(0, 0, 0), x_dir=(1, 0, 0), z_dir=(0, 1, 0)).offset(TPS_SILIKON_GN21_20_CUKUR_20_START)):
        with Locations(Location((504, 220, 0), (0, 0, 90))):
            Circle(SKETCH20_R)
    extrude(amount=TPS_SILIKON_GN21_20_CUKUR_20_DEPTH, mode=Mode.SUBTRACT)

    # Sketch21 → TPS_silikon_GN21_20_cukur_21 (cut)
    with BuildSketch(Plane(origin=(0, 0, 0), x_dir=(1, 0, 0), z_dir=(0, 1, 0)).offset(TPS_SILIKON_GN21_20_CUKUR_21_START)):
        with Locations(Location((504, 90, 0), (0, 0, 90))):
            Circle(SKETCH21_R)
    extrude(amount=TPS_SILIKON_GN21_20_CUKUR_21_DEPTH, mode=Mode.SUBTRACT)


solid = part.part
